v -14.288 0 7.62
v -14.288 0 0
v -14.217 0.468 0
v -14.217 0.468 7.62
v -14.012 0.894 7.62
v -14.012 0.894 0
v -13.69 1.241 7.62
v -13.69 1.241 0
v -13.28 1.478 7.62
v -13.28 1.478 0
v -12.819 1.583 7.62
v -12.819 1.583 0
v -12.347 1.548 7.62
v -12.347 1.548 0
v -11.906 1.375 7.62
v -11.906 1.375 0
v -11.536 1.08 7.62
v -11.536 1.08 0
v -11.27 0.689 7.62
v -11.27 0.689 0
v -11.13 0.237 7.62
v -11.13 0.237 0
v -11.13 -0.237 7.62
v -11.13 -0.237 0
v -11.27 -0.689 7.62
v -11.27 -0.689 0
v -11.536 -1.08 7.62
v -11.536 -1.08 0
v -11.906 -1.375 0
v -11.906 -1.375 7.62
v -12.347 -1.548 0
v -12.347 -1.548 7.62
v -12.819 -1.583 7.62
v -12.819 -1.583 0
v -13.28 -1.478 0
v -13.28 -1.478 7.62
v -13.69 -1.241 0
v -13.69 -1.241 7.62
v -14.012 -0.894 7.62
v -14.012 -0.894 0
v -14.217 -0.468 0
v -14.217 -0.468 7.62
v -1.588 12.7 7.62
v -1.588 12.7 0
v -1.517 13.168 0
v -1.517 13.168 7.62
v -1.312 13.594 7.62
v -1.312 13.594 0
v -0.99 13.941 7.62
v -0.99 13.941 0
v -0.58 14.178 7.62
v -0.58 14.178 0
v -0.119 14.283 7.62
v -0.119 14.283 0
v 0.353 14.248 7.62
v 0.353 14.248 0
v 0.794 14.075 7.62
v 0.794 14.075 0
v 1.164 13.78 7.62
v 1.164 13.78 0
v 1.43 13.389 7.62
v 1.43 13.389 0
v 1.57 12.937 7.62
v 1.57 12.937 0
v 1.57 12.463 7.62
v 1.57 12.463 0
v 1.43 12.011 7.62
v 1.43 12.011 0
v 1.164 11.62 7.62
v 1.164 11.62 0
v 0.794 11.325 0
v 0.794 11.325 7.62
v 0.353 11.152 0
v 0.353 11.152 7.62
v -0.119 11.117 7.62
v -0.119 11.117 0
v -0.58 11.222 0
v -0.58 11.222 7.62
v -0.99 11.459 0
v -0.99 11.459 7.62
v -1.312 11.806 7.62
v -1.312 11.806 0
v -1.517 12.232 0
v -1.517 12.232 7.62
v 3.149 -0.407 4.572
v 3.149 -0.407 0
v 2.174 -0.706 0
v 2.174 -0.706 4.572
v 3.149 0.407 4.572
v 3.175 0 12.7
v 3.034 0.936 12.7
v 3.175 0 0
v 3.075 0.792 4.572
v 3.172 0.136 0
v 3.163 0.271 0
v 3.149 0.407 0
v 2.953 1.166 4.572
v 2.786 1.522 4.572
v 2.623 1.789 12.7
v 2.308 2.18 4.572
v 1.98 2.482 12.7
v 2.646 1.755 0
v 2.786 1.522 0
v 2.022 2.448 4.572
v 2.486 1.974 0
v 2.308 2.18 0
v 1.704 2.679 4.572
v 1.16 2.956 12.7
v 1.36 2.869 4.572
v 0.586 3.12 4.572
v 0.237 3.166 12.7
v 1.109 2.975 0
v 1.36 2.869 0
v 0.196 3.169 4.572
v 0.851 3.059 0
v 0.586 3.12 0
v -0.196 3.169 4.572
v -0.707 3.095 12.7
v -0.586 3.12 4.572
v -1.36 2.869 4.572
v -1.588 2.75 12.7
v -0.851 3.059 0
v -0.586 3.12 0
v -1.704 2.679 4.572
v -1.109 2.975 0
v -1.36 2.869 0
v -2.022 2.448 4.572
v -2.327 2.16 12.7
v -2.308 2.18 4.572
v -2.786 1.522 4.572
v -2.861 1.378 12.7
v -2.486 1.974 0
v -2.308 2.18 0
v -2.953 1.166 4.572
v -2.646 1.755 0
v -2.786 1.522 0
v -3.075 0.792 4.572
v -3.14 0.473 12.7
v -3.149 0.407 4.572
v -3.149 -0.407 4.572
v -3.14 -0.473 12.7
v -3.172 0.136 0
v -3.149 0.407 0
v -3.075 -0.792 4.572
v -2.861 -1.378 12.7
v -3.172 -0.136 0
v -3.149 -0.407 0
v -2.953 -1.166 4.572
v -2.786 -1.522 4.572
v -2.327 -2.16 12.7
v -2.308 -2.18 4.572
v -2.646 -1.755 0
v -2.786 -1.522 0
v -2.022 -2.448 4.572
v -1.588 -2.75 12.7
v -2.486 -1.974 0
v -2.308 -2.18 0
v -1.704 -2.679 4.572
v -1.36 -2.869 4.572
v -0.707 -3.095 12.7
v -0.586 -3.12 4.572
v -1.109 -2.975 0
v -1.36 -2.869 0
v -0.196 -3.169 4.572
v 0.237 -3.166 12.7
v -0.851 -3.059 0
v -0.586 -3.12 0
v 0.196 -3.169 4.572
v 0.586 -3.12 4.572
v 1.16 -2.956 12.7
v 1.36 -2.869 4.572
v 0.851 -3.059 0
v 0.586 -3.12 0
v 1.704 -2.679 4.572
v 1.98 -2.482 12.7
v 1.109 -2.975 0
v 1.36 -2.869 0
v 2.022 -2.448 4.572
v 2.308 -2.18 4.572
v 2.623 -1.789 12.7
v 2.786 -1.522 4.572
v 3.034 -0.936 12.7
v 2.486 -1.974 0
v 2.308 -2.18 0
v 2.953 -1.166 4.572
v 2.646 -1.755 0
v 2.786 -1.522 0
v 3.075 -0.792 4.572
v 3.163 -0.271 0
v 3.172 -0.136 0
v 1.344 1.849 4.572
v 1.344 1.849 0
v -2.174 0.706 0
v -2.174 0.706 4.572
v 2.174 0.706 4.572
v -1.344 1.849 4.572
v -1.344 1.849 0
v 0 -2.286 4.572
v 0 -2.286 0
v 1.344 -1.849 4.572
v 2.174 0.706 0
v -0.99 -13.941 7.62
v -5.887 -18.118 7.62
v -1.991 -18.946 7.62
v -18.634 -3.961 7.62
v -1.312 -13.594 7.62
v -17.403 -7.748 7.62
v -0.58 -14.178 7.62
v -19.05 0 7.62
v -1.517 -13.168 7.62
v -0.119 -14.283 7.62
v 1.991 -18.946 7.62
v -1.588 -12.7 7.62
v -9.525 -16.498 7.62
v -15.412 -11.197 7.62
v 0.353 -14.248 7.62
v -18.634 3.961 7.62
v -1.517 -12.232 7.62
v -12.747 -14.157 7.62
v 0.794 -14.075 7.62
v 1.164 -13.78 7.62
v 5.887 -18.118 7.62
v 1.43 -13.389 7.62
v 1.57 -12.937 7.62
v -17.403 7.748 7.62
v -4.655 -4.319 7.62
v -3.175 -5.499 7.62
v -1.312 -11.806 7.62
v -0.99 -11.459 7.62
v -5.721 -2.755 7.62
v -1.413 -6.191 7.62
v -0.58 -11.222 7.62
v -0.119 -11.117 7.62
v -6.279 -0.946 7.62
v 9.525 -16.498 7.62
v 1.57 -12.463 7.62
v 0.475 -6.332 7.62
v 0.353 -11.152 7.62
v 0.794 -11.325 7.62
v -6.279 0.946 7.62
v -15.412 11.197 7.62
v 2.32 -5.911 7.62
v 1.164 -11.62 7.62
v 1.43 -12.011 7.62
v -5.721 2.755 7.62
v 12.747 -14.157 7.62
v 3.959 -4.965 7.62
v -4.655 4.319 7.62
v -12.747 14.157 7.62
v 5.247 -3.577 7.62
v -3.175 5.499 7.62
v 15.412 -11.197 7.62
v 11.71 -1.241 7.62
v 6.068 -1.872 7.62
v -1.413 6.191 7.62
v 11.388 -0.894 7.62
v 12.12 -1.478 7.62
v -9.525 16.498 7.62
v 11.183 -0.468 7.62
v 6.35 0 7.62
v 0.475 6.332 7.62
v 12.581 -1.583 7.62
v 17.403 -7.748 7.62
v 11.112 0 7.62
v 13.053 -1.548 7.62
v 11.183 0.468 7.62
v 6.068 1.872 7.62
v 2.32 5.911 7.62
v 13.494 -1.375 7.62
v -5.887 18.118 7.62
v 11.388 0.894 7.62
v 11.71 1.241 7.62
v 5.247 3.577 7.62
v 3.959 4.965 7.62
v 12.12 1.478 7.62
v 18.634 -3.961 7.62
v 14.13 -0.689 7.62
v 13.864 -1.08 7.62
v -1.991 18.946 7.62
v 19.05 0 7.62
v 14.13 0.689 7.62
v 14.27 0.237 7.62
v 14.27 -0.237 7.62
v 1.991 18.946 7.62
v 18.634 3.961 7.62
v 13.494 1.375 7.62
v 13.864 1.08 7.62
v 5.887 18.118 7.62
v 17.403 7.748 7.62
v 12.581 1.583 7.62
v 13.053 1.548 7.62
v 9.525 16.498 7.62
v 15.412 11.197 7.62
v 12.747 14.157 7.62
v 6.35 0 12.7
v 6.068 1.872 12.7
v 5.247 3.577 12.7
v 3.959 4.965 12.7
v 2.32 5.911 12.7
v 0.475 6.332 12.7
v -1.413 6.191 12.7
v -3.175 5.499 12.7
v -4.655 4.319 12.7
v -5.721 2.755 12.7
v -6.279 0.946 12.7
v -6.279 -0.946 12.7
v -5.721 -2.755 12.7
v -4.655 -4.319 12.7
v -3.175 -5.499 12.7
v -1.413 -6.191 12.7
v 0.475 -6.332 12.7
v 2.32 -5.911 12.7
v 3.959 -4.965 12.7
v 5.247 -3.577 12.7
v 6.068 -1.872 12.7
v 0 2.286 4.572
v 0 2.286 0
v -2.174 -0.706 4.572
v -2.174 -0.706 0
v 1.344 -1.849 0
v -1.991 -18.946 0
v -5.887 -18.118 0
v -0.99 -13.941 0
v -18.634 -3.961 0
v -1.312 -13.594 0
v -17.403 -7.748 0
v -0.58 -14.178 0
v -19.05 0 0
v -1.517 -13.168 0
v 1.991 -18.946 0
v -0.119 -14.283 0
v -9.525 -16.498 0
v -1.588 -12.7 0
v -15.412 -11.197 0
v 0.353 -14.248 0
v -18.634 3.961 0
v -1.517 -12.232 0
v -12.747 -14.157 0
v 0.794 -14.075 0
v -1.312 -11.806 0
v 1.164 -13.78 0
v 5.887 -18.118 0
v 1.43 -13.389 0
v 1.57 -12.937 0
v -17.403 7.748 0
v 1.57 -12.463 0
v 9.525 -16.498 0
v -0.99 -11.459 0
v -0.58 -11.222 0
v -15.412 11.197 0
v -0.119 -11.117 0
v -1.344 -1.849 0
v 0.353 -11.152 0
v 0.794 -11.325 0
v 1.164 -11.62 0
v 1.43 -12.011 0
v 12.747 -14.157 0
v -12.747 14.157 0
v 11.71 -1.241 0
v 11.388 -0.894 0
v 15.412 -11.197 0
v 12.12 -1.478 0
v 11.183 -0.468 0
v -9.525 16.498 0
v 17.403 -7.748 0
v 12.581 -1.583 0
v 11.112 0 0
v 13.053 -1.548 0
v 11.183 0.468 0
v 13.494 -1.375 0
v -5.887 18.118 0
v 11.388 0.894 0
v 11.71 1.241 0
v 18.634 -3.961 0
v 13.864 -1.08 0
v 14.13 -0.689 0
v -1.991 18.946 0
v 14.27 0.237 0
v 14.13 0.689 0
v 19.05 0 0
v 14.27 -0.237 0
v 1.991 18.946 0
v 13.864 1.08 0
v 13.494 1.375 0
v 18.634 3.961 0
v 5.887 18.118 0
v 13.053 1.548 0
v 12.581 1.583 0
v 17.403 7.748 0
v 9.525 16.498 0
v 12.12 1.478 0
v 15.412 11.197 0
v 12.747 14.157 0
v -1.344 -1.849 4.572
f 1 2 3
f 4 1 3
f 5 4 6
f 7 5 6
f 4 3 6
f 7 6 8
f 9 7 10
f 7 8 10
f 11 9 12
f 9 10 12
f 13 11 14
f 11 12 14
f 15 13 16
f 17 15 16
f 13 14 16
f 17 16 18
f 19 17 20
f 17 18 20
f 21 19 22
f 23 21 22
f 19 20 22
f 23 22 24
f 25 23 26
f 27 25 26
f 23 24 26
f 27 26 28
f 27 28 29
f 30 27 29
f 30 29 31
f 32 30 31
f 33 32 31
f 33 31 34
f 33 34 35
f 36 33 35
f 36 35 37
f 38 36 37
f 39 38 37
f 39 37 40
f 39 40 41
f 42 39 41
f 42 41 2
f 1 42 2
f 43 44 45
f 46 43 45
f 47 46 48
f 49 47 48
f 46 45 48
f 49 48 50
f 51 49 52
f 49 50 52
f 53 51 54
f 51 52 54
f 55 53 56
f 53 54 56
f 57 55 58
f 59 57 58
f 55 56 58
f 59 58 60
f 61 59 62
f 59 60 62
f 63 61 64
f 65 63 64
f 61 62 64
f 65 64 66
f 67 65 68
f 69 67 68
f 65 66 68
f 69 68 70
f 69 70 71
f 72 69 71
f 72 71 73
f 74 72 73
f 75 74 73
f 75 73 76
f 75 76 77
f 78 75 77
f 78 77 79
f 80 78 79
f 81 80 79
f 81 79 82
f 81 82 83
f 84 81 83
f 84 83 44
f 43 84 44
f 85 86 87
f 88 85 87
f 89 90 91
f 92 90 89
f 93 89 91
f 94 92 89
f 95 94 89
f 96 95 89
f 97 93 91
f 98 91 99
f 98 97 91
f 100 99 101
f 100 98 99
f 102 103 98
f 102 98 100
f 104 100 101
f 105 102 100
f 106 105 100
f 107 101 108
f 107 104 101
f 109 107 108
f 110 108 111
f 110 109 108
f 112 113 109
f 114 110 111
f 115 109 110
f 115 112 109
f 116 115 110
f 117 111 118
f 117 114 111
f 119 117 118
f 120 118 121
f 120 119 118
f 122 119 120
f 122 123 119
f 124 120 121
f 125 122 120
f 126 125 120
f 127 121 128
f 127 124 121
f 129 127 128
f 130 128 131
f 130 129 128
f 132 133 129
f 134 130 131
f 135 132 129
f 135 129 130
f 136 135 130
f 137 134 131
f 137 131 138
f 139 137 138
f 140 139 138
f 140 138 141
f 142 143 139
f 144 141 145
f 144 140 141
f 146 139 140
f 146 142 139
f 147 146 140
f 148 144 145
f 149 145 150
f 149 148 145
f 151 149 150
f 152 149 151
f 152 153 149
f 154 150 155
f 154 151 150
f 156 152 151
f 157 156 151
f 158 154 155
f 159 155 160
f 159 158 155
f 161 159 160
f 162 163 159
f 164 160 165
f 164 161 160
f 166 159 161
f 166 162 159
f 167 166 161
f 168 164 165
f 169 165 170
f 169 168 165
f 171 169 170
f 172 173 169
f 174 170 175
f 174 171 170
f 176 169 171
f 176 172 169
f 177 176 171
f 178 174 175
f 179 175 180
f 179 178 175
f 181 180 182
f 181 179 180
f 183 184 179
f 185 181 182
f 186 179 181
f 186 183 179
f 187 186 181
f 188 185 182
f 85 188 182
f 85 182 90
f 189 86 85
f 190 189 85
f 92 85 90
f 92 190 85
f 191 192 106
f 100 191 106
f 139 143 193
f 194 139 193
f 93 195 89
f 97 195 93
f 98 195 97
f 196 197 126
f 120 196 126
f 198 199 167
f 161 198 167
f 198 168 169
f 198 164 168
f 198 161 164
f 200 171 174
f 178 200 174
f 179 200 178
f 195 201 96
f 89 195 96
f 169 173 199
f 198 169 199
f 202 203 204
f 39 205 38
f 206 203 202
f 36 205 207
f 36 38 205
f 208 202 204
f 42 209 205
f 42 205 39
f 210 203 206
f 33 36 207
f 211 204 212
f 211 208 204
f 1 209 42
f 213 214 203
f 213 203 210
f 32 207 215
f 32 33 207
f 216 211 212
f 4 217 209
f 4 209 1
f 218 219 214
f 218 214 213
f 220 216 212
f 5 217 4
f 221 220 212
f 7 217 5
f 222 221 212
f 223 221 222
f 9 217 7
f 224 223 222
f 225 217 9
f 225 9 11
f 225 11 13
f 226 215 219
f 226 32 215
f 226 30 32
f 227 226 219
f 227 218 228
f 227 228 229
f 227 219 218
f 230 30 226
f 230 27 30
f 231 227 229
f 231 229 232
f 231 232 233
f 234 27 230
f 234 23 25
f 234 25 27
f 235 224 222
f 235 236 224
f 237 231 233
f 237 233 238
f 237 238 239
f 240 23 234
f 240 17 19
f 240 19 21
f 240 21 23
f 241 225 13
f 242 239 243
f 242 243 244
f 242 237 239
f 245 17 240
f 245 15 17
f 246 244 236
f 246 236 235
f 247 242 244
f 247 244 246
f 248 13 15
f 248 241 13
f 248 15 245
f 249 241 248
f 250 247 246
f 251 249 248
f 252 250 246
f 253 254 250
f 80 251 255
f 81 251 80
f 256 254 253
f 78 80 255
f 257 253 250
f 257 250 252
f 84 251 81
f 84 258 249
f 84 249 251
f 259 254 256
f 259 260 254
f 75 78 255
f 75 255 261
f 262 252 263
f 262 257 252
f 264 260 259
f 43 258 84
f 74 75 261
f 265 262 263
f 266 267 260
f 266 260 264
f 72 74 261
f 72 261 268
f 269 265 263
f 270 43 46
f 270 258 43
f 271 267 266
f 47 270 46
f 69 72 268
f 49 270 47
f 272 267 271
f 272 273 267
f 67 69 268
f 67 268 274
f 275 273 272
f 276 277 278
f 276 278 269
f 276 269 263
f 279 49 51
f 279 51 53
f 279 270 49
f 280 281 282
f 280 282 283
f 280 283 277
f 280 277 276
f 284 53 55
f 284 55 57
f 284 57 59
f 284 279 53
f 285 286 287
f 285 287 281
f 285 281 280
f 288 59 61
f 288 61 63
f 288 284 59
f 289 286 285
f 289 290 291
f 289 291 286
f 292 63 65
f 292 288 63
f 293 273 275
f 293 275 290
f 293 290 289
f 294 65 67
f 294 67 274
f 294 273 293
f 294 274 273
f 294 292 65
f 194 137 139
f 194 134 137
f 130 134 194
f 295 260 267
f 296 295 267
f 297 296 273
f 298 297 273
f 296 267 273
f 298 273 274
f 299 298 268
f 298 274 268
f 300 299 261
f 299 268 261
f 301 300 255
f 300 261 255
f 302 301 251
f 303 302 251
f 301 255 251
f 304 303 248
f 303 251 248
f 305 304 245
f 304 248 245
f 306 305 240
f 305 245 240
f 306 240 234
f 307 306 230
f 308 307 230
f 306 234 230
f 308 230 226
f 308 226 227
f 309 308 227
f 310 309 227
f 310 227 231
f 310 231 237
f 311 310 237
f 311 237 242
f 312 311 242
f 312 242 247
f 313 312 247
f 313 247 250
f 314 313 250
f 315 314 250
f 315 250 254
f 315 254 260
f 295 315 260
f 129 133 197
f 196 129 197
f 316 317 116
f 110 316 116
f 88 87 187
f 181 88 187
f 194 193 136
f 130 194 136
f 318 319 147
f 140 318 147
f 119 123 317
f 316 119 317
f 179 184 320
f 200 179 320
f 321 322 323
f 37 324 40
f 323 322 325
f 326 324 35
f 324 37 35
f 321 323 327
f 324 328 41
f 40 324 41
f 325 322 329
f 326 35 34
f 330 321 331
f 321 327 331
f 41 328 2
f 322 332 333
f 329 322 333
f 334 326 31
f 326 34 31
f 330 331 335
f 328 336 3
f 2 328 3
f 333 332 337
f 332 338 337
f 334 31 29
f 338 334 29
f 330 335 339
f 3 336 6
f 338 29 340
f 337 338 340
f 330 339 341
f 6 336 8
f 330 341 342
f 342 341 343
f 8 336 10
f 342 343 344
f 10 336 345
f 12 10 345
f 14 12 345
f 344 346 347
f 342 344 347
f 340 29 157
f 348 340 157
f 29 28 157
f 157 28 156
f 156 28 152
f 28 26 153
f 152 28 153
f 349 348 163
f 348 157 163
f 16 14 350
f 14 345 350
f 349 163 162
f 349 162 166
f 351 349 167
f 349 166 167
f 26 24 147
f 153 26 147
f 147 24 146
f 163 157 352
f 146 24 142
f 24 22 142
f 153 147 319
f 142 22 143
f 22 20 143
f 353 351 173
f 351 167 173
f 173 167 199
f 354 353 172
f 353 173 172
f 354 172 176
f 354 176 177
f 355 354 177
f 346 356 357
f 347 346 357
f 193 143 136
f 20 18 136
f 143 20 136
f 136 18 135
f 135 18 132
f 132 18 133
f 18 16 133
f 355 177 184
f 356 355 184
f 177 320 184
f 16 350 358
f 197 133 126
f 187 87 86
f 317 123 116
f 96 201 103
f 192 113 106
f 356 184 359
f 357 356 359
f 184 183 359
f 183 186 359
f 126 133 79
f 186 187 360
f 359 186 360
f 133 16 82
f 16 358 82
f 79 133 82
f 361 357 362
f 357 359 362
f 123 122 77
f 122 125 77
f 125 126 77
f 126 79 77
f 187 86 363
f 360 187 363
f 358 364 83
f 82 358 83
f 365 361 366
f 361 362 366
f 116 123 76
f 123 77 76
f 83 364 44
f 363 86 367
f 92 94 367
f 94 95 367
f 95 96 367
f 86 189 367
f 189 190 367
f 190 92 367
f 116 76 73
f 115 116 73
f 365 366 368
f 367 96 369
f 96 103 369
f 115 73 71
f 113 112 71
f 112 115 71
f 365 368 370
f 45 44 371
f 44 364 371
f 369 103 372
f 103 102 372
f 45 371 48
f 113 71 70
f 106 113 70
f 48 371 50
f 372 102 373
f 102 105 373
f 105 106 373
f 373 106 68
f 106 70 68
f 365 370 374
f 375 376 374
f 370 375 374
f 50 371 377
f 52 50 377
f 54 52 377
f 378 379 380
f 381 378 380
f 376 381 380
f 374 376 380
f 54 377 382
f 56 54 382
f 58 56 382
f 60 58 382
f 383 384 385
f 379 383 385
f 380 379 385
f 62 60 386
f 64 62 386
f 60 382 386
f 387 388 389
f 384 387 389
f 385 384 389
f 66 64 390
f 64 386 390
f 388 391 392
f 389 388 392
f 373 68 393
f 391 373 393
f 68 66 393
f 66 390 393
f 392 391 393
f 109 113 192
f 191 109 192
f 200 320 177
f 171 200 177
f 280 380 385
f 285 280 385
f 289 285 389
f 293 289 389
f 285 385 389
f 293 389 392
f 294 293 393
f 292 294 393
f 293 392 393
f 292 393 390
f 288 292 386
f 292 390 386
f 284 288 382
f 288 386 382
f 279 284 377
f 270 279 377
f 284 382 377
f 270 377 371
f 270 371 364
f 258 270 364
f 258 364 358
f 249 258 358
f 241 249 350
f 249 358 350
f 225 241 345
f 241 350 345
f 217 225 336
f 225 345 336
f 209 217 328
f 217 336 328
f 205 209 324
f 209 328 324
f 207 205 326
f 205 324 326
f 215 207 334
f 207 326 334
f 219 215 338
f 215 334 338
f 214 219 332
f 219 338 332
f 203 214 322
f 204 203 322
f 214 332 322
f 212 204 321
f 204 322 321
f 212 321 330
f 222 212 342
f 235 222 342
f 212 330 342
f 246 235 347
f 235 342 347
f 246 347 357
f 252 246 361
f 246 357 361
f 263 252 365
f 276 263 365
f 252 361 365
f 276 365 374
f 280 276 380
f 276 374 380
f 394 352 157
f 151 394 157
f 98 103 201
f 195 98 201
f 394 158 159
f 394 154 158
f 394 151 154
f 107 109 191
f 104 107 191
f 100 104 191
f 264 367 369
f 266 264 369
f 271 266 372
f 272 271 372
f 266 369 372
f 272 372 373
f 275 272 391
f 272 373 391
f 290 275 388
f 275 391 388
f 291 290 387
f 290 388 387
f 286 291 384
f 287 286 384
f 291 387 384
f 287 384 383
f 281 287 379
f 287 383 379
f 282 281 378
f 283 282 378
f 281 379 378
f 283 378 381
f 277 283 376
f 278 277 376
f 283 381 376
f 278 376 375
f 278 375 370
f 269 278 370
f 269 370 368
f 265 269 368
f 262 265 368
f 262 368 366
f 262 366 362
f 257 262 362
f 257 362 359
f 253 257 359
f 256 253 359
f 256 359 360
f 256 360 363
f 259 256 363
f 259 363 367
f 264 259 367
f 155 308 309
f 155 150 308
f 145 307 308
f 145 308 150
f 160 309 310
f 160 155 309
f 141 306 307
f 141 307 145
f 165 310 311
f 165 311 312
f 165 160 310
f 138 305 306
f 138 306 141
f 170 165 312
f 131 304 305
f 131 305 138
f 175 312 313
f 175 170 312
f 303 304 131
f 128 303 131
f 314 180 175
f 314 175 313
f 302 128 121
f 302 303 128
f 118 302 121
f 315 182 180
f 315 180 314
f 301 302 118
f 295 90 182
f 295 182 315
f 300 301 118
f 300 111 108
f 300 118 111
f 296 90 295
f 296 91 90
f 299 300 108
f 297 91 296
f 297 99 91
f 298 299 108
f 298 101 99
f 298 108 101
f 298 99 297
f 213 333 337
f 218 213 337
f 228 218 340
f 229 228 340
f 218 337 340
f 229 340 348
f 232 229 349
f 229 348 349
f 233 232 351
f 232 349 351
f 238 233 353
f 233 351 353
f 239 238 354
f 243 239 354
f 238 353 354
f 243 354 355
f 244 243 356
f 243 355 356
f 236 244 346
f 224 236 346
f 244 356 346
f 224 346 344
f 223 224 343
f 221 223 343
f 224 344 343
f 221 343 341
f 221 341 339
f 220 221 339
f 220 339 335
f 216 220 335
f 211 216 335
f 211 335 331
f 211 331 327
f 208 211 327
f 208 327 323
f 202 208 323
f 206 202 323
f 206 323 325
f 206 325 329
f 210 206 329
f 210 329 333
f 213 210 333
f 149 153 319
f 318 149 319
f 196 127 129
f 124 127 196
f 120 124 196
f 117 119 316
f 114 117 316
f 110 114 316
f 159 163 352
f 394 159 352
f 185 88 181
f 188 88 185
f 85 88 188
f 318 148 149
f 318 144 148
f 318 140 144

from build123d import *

# Parameters (mm, degrees)
F0_R     = 6.35
F0_R_2   = 3.175
F1_DEPTH = 12.7
F2_R     = 19.05
F2_R_2   = 6.35
F3_DEPTH = 7.62
F5_DEPTH = 4.572
F7_D     = 3.175


with BuildPart() as f1:
    # F0 (on Top) → F1 (new body)
    with BuildSketch(Plane.XY):
        Circle(F0_R)
        Circle(F0_R_2, mode=Mode.SUBTRACT)
    extrude(amount=F1_DEPTH)

    # F2 (on Top) → F3 (join)
    with BuildSketch(Plane.XY):
        Circle(F2_R)
        Circle(F2_R_2, mode=Mode.SUBTRACT)
    extrude(amount=F3_DEPTH)

    # F4 (on Top) → F5 (join)
    with BuildSketch(Plane.XY):
        Polygon((-0.803219, 3.429), (0, 2.286), (0, 3.429), align=None)
        Polygon((0, 3.429), (0, 2.286), (0.803219, 3.429), align=None)
        Polygon((1.365698, 3.246239), (1.343677, 1.849413), (2.015516, 2.774119), align=None)
        Polygon((2.015516, 2.774119), (1.343677, 1.849413), (2.665333, 2.301999), align=None)
        Polygon((3.012965, 1.823525), (2.174115, 0.706413), (3.261173, 1.059619), align=None)
        Polygon((3.261173, 1.059619), (2.174115, 0.706413), (3.509381, 0.295713), align=None)
        Polygon((0, -2.286), (-0.803219, -3.429), (0, -3.429), align=None)
        Polygon((0.803219, -3.429), (0, -2.286), (0, -3.429), align=None)
        Polygon((1.365698, -3.246239), (2.015516, -2.774119), (1.343677, -1.849413), align=None)
        Polygon((1.343677, -1.849413), (2.015516, -2.774119), (2.665333, -2.301999), align=None)
        Polygon((3.012965, -1.823525), (3.261173, -1.059619), (2.174115, -0.706413), align=None)
        Polygon((2.174115, -0.706413), (3.261173, -1.059619), (3.509381, -0.295713), align=None)
        Polygon((-2.665333, 2.301999), (-1.343677, 1.849413), (-2.015516, 2.774119), align=None)
        Polygon((-2.015516, 2.774119), (-1.343677, 1.849413), (-1.365698, 3.246239), align=None)
        Polygon((-3.012965, 1.823525), (-3.261173, 1.059619), (-2.174115, 0.706413), align=None)
        Polygon((-2.174115, 0.706413), (-3.261173, 1.059619), (-3.509381, 0.295713), align=None)
        Polygon((-3.261173, -1.059619), (-2.174115, -0.706413), (-3.509381, -0.295713), align=None)
        Polygon((-3.012965, -1.823525), (-2.174115, -0.706413), (-3.261173, -1.059619), align=None)
        Polygon((-2.015516, -2.774119), (-1.343677, -1.849413), (-2.665333, -2.301999), align=None)
        Polygon((-1.365698, -3.246239), (-1.343677, -1.849413), (-2.015516, -2.774119), align=None)
    extrude(amount=F5_DEPTH)

    # F7 (through all)
    with Locations(Plane.XY.offset(7.62)):
        with Locations((0, -12.7), (-12.7, 0), (0, 12.7), (12.7, 0)):
            Hole(F7_D / 2)


solid = f1.part
